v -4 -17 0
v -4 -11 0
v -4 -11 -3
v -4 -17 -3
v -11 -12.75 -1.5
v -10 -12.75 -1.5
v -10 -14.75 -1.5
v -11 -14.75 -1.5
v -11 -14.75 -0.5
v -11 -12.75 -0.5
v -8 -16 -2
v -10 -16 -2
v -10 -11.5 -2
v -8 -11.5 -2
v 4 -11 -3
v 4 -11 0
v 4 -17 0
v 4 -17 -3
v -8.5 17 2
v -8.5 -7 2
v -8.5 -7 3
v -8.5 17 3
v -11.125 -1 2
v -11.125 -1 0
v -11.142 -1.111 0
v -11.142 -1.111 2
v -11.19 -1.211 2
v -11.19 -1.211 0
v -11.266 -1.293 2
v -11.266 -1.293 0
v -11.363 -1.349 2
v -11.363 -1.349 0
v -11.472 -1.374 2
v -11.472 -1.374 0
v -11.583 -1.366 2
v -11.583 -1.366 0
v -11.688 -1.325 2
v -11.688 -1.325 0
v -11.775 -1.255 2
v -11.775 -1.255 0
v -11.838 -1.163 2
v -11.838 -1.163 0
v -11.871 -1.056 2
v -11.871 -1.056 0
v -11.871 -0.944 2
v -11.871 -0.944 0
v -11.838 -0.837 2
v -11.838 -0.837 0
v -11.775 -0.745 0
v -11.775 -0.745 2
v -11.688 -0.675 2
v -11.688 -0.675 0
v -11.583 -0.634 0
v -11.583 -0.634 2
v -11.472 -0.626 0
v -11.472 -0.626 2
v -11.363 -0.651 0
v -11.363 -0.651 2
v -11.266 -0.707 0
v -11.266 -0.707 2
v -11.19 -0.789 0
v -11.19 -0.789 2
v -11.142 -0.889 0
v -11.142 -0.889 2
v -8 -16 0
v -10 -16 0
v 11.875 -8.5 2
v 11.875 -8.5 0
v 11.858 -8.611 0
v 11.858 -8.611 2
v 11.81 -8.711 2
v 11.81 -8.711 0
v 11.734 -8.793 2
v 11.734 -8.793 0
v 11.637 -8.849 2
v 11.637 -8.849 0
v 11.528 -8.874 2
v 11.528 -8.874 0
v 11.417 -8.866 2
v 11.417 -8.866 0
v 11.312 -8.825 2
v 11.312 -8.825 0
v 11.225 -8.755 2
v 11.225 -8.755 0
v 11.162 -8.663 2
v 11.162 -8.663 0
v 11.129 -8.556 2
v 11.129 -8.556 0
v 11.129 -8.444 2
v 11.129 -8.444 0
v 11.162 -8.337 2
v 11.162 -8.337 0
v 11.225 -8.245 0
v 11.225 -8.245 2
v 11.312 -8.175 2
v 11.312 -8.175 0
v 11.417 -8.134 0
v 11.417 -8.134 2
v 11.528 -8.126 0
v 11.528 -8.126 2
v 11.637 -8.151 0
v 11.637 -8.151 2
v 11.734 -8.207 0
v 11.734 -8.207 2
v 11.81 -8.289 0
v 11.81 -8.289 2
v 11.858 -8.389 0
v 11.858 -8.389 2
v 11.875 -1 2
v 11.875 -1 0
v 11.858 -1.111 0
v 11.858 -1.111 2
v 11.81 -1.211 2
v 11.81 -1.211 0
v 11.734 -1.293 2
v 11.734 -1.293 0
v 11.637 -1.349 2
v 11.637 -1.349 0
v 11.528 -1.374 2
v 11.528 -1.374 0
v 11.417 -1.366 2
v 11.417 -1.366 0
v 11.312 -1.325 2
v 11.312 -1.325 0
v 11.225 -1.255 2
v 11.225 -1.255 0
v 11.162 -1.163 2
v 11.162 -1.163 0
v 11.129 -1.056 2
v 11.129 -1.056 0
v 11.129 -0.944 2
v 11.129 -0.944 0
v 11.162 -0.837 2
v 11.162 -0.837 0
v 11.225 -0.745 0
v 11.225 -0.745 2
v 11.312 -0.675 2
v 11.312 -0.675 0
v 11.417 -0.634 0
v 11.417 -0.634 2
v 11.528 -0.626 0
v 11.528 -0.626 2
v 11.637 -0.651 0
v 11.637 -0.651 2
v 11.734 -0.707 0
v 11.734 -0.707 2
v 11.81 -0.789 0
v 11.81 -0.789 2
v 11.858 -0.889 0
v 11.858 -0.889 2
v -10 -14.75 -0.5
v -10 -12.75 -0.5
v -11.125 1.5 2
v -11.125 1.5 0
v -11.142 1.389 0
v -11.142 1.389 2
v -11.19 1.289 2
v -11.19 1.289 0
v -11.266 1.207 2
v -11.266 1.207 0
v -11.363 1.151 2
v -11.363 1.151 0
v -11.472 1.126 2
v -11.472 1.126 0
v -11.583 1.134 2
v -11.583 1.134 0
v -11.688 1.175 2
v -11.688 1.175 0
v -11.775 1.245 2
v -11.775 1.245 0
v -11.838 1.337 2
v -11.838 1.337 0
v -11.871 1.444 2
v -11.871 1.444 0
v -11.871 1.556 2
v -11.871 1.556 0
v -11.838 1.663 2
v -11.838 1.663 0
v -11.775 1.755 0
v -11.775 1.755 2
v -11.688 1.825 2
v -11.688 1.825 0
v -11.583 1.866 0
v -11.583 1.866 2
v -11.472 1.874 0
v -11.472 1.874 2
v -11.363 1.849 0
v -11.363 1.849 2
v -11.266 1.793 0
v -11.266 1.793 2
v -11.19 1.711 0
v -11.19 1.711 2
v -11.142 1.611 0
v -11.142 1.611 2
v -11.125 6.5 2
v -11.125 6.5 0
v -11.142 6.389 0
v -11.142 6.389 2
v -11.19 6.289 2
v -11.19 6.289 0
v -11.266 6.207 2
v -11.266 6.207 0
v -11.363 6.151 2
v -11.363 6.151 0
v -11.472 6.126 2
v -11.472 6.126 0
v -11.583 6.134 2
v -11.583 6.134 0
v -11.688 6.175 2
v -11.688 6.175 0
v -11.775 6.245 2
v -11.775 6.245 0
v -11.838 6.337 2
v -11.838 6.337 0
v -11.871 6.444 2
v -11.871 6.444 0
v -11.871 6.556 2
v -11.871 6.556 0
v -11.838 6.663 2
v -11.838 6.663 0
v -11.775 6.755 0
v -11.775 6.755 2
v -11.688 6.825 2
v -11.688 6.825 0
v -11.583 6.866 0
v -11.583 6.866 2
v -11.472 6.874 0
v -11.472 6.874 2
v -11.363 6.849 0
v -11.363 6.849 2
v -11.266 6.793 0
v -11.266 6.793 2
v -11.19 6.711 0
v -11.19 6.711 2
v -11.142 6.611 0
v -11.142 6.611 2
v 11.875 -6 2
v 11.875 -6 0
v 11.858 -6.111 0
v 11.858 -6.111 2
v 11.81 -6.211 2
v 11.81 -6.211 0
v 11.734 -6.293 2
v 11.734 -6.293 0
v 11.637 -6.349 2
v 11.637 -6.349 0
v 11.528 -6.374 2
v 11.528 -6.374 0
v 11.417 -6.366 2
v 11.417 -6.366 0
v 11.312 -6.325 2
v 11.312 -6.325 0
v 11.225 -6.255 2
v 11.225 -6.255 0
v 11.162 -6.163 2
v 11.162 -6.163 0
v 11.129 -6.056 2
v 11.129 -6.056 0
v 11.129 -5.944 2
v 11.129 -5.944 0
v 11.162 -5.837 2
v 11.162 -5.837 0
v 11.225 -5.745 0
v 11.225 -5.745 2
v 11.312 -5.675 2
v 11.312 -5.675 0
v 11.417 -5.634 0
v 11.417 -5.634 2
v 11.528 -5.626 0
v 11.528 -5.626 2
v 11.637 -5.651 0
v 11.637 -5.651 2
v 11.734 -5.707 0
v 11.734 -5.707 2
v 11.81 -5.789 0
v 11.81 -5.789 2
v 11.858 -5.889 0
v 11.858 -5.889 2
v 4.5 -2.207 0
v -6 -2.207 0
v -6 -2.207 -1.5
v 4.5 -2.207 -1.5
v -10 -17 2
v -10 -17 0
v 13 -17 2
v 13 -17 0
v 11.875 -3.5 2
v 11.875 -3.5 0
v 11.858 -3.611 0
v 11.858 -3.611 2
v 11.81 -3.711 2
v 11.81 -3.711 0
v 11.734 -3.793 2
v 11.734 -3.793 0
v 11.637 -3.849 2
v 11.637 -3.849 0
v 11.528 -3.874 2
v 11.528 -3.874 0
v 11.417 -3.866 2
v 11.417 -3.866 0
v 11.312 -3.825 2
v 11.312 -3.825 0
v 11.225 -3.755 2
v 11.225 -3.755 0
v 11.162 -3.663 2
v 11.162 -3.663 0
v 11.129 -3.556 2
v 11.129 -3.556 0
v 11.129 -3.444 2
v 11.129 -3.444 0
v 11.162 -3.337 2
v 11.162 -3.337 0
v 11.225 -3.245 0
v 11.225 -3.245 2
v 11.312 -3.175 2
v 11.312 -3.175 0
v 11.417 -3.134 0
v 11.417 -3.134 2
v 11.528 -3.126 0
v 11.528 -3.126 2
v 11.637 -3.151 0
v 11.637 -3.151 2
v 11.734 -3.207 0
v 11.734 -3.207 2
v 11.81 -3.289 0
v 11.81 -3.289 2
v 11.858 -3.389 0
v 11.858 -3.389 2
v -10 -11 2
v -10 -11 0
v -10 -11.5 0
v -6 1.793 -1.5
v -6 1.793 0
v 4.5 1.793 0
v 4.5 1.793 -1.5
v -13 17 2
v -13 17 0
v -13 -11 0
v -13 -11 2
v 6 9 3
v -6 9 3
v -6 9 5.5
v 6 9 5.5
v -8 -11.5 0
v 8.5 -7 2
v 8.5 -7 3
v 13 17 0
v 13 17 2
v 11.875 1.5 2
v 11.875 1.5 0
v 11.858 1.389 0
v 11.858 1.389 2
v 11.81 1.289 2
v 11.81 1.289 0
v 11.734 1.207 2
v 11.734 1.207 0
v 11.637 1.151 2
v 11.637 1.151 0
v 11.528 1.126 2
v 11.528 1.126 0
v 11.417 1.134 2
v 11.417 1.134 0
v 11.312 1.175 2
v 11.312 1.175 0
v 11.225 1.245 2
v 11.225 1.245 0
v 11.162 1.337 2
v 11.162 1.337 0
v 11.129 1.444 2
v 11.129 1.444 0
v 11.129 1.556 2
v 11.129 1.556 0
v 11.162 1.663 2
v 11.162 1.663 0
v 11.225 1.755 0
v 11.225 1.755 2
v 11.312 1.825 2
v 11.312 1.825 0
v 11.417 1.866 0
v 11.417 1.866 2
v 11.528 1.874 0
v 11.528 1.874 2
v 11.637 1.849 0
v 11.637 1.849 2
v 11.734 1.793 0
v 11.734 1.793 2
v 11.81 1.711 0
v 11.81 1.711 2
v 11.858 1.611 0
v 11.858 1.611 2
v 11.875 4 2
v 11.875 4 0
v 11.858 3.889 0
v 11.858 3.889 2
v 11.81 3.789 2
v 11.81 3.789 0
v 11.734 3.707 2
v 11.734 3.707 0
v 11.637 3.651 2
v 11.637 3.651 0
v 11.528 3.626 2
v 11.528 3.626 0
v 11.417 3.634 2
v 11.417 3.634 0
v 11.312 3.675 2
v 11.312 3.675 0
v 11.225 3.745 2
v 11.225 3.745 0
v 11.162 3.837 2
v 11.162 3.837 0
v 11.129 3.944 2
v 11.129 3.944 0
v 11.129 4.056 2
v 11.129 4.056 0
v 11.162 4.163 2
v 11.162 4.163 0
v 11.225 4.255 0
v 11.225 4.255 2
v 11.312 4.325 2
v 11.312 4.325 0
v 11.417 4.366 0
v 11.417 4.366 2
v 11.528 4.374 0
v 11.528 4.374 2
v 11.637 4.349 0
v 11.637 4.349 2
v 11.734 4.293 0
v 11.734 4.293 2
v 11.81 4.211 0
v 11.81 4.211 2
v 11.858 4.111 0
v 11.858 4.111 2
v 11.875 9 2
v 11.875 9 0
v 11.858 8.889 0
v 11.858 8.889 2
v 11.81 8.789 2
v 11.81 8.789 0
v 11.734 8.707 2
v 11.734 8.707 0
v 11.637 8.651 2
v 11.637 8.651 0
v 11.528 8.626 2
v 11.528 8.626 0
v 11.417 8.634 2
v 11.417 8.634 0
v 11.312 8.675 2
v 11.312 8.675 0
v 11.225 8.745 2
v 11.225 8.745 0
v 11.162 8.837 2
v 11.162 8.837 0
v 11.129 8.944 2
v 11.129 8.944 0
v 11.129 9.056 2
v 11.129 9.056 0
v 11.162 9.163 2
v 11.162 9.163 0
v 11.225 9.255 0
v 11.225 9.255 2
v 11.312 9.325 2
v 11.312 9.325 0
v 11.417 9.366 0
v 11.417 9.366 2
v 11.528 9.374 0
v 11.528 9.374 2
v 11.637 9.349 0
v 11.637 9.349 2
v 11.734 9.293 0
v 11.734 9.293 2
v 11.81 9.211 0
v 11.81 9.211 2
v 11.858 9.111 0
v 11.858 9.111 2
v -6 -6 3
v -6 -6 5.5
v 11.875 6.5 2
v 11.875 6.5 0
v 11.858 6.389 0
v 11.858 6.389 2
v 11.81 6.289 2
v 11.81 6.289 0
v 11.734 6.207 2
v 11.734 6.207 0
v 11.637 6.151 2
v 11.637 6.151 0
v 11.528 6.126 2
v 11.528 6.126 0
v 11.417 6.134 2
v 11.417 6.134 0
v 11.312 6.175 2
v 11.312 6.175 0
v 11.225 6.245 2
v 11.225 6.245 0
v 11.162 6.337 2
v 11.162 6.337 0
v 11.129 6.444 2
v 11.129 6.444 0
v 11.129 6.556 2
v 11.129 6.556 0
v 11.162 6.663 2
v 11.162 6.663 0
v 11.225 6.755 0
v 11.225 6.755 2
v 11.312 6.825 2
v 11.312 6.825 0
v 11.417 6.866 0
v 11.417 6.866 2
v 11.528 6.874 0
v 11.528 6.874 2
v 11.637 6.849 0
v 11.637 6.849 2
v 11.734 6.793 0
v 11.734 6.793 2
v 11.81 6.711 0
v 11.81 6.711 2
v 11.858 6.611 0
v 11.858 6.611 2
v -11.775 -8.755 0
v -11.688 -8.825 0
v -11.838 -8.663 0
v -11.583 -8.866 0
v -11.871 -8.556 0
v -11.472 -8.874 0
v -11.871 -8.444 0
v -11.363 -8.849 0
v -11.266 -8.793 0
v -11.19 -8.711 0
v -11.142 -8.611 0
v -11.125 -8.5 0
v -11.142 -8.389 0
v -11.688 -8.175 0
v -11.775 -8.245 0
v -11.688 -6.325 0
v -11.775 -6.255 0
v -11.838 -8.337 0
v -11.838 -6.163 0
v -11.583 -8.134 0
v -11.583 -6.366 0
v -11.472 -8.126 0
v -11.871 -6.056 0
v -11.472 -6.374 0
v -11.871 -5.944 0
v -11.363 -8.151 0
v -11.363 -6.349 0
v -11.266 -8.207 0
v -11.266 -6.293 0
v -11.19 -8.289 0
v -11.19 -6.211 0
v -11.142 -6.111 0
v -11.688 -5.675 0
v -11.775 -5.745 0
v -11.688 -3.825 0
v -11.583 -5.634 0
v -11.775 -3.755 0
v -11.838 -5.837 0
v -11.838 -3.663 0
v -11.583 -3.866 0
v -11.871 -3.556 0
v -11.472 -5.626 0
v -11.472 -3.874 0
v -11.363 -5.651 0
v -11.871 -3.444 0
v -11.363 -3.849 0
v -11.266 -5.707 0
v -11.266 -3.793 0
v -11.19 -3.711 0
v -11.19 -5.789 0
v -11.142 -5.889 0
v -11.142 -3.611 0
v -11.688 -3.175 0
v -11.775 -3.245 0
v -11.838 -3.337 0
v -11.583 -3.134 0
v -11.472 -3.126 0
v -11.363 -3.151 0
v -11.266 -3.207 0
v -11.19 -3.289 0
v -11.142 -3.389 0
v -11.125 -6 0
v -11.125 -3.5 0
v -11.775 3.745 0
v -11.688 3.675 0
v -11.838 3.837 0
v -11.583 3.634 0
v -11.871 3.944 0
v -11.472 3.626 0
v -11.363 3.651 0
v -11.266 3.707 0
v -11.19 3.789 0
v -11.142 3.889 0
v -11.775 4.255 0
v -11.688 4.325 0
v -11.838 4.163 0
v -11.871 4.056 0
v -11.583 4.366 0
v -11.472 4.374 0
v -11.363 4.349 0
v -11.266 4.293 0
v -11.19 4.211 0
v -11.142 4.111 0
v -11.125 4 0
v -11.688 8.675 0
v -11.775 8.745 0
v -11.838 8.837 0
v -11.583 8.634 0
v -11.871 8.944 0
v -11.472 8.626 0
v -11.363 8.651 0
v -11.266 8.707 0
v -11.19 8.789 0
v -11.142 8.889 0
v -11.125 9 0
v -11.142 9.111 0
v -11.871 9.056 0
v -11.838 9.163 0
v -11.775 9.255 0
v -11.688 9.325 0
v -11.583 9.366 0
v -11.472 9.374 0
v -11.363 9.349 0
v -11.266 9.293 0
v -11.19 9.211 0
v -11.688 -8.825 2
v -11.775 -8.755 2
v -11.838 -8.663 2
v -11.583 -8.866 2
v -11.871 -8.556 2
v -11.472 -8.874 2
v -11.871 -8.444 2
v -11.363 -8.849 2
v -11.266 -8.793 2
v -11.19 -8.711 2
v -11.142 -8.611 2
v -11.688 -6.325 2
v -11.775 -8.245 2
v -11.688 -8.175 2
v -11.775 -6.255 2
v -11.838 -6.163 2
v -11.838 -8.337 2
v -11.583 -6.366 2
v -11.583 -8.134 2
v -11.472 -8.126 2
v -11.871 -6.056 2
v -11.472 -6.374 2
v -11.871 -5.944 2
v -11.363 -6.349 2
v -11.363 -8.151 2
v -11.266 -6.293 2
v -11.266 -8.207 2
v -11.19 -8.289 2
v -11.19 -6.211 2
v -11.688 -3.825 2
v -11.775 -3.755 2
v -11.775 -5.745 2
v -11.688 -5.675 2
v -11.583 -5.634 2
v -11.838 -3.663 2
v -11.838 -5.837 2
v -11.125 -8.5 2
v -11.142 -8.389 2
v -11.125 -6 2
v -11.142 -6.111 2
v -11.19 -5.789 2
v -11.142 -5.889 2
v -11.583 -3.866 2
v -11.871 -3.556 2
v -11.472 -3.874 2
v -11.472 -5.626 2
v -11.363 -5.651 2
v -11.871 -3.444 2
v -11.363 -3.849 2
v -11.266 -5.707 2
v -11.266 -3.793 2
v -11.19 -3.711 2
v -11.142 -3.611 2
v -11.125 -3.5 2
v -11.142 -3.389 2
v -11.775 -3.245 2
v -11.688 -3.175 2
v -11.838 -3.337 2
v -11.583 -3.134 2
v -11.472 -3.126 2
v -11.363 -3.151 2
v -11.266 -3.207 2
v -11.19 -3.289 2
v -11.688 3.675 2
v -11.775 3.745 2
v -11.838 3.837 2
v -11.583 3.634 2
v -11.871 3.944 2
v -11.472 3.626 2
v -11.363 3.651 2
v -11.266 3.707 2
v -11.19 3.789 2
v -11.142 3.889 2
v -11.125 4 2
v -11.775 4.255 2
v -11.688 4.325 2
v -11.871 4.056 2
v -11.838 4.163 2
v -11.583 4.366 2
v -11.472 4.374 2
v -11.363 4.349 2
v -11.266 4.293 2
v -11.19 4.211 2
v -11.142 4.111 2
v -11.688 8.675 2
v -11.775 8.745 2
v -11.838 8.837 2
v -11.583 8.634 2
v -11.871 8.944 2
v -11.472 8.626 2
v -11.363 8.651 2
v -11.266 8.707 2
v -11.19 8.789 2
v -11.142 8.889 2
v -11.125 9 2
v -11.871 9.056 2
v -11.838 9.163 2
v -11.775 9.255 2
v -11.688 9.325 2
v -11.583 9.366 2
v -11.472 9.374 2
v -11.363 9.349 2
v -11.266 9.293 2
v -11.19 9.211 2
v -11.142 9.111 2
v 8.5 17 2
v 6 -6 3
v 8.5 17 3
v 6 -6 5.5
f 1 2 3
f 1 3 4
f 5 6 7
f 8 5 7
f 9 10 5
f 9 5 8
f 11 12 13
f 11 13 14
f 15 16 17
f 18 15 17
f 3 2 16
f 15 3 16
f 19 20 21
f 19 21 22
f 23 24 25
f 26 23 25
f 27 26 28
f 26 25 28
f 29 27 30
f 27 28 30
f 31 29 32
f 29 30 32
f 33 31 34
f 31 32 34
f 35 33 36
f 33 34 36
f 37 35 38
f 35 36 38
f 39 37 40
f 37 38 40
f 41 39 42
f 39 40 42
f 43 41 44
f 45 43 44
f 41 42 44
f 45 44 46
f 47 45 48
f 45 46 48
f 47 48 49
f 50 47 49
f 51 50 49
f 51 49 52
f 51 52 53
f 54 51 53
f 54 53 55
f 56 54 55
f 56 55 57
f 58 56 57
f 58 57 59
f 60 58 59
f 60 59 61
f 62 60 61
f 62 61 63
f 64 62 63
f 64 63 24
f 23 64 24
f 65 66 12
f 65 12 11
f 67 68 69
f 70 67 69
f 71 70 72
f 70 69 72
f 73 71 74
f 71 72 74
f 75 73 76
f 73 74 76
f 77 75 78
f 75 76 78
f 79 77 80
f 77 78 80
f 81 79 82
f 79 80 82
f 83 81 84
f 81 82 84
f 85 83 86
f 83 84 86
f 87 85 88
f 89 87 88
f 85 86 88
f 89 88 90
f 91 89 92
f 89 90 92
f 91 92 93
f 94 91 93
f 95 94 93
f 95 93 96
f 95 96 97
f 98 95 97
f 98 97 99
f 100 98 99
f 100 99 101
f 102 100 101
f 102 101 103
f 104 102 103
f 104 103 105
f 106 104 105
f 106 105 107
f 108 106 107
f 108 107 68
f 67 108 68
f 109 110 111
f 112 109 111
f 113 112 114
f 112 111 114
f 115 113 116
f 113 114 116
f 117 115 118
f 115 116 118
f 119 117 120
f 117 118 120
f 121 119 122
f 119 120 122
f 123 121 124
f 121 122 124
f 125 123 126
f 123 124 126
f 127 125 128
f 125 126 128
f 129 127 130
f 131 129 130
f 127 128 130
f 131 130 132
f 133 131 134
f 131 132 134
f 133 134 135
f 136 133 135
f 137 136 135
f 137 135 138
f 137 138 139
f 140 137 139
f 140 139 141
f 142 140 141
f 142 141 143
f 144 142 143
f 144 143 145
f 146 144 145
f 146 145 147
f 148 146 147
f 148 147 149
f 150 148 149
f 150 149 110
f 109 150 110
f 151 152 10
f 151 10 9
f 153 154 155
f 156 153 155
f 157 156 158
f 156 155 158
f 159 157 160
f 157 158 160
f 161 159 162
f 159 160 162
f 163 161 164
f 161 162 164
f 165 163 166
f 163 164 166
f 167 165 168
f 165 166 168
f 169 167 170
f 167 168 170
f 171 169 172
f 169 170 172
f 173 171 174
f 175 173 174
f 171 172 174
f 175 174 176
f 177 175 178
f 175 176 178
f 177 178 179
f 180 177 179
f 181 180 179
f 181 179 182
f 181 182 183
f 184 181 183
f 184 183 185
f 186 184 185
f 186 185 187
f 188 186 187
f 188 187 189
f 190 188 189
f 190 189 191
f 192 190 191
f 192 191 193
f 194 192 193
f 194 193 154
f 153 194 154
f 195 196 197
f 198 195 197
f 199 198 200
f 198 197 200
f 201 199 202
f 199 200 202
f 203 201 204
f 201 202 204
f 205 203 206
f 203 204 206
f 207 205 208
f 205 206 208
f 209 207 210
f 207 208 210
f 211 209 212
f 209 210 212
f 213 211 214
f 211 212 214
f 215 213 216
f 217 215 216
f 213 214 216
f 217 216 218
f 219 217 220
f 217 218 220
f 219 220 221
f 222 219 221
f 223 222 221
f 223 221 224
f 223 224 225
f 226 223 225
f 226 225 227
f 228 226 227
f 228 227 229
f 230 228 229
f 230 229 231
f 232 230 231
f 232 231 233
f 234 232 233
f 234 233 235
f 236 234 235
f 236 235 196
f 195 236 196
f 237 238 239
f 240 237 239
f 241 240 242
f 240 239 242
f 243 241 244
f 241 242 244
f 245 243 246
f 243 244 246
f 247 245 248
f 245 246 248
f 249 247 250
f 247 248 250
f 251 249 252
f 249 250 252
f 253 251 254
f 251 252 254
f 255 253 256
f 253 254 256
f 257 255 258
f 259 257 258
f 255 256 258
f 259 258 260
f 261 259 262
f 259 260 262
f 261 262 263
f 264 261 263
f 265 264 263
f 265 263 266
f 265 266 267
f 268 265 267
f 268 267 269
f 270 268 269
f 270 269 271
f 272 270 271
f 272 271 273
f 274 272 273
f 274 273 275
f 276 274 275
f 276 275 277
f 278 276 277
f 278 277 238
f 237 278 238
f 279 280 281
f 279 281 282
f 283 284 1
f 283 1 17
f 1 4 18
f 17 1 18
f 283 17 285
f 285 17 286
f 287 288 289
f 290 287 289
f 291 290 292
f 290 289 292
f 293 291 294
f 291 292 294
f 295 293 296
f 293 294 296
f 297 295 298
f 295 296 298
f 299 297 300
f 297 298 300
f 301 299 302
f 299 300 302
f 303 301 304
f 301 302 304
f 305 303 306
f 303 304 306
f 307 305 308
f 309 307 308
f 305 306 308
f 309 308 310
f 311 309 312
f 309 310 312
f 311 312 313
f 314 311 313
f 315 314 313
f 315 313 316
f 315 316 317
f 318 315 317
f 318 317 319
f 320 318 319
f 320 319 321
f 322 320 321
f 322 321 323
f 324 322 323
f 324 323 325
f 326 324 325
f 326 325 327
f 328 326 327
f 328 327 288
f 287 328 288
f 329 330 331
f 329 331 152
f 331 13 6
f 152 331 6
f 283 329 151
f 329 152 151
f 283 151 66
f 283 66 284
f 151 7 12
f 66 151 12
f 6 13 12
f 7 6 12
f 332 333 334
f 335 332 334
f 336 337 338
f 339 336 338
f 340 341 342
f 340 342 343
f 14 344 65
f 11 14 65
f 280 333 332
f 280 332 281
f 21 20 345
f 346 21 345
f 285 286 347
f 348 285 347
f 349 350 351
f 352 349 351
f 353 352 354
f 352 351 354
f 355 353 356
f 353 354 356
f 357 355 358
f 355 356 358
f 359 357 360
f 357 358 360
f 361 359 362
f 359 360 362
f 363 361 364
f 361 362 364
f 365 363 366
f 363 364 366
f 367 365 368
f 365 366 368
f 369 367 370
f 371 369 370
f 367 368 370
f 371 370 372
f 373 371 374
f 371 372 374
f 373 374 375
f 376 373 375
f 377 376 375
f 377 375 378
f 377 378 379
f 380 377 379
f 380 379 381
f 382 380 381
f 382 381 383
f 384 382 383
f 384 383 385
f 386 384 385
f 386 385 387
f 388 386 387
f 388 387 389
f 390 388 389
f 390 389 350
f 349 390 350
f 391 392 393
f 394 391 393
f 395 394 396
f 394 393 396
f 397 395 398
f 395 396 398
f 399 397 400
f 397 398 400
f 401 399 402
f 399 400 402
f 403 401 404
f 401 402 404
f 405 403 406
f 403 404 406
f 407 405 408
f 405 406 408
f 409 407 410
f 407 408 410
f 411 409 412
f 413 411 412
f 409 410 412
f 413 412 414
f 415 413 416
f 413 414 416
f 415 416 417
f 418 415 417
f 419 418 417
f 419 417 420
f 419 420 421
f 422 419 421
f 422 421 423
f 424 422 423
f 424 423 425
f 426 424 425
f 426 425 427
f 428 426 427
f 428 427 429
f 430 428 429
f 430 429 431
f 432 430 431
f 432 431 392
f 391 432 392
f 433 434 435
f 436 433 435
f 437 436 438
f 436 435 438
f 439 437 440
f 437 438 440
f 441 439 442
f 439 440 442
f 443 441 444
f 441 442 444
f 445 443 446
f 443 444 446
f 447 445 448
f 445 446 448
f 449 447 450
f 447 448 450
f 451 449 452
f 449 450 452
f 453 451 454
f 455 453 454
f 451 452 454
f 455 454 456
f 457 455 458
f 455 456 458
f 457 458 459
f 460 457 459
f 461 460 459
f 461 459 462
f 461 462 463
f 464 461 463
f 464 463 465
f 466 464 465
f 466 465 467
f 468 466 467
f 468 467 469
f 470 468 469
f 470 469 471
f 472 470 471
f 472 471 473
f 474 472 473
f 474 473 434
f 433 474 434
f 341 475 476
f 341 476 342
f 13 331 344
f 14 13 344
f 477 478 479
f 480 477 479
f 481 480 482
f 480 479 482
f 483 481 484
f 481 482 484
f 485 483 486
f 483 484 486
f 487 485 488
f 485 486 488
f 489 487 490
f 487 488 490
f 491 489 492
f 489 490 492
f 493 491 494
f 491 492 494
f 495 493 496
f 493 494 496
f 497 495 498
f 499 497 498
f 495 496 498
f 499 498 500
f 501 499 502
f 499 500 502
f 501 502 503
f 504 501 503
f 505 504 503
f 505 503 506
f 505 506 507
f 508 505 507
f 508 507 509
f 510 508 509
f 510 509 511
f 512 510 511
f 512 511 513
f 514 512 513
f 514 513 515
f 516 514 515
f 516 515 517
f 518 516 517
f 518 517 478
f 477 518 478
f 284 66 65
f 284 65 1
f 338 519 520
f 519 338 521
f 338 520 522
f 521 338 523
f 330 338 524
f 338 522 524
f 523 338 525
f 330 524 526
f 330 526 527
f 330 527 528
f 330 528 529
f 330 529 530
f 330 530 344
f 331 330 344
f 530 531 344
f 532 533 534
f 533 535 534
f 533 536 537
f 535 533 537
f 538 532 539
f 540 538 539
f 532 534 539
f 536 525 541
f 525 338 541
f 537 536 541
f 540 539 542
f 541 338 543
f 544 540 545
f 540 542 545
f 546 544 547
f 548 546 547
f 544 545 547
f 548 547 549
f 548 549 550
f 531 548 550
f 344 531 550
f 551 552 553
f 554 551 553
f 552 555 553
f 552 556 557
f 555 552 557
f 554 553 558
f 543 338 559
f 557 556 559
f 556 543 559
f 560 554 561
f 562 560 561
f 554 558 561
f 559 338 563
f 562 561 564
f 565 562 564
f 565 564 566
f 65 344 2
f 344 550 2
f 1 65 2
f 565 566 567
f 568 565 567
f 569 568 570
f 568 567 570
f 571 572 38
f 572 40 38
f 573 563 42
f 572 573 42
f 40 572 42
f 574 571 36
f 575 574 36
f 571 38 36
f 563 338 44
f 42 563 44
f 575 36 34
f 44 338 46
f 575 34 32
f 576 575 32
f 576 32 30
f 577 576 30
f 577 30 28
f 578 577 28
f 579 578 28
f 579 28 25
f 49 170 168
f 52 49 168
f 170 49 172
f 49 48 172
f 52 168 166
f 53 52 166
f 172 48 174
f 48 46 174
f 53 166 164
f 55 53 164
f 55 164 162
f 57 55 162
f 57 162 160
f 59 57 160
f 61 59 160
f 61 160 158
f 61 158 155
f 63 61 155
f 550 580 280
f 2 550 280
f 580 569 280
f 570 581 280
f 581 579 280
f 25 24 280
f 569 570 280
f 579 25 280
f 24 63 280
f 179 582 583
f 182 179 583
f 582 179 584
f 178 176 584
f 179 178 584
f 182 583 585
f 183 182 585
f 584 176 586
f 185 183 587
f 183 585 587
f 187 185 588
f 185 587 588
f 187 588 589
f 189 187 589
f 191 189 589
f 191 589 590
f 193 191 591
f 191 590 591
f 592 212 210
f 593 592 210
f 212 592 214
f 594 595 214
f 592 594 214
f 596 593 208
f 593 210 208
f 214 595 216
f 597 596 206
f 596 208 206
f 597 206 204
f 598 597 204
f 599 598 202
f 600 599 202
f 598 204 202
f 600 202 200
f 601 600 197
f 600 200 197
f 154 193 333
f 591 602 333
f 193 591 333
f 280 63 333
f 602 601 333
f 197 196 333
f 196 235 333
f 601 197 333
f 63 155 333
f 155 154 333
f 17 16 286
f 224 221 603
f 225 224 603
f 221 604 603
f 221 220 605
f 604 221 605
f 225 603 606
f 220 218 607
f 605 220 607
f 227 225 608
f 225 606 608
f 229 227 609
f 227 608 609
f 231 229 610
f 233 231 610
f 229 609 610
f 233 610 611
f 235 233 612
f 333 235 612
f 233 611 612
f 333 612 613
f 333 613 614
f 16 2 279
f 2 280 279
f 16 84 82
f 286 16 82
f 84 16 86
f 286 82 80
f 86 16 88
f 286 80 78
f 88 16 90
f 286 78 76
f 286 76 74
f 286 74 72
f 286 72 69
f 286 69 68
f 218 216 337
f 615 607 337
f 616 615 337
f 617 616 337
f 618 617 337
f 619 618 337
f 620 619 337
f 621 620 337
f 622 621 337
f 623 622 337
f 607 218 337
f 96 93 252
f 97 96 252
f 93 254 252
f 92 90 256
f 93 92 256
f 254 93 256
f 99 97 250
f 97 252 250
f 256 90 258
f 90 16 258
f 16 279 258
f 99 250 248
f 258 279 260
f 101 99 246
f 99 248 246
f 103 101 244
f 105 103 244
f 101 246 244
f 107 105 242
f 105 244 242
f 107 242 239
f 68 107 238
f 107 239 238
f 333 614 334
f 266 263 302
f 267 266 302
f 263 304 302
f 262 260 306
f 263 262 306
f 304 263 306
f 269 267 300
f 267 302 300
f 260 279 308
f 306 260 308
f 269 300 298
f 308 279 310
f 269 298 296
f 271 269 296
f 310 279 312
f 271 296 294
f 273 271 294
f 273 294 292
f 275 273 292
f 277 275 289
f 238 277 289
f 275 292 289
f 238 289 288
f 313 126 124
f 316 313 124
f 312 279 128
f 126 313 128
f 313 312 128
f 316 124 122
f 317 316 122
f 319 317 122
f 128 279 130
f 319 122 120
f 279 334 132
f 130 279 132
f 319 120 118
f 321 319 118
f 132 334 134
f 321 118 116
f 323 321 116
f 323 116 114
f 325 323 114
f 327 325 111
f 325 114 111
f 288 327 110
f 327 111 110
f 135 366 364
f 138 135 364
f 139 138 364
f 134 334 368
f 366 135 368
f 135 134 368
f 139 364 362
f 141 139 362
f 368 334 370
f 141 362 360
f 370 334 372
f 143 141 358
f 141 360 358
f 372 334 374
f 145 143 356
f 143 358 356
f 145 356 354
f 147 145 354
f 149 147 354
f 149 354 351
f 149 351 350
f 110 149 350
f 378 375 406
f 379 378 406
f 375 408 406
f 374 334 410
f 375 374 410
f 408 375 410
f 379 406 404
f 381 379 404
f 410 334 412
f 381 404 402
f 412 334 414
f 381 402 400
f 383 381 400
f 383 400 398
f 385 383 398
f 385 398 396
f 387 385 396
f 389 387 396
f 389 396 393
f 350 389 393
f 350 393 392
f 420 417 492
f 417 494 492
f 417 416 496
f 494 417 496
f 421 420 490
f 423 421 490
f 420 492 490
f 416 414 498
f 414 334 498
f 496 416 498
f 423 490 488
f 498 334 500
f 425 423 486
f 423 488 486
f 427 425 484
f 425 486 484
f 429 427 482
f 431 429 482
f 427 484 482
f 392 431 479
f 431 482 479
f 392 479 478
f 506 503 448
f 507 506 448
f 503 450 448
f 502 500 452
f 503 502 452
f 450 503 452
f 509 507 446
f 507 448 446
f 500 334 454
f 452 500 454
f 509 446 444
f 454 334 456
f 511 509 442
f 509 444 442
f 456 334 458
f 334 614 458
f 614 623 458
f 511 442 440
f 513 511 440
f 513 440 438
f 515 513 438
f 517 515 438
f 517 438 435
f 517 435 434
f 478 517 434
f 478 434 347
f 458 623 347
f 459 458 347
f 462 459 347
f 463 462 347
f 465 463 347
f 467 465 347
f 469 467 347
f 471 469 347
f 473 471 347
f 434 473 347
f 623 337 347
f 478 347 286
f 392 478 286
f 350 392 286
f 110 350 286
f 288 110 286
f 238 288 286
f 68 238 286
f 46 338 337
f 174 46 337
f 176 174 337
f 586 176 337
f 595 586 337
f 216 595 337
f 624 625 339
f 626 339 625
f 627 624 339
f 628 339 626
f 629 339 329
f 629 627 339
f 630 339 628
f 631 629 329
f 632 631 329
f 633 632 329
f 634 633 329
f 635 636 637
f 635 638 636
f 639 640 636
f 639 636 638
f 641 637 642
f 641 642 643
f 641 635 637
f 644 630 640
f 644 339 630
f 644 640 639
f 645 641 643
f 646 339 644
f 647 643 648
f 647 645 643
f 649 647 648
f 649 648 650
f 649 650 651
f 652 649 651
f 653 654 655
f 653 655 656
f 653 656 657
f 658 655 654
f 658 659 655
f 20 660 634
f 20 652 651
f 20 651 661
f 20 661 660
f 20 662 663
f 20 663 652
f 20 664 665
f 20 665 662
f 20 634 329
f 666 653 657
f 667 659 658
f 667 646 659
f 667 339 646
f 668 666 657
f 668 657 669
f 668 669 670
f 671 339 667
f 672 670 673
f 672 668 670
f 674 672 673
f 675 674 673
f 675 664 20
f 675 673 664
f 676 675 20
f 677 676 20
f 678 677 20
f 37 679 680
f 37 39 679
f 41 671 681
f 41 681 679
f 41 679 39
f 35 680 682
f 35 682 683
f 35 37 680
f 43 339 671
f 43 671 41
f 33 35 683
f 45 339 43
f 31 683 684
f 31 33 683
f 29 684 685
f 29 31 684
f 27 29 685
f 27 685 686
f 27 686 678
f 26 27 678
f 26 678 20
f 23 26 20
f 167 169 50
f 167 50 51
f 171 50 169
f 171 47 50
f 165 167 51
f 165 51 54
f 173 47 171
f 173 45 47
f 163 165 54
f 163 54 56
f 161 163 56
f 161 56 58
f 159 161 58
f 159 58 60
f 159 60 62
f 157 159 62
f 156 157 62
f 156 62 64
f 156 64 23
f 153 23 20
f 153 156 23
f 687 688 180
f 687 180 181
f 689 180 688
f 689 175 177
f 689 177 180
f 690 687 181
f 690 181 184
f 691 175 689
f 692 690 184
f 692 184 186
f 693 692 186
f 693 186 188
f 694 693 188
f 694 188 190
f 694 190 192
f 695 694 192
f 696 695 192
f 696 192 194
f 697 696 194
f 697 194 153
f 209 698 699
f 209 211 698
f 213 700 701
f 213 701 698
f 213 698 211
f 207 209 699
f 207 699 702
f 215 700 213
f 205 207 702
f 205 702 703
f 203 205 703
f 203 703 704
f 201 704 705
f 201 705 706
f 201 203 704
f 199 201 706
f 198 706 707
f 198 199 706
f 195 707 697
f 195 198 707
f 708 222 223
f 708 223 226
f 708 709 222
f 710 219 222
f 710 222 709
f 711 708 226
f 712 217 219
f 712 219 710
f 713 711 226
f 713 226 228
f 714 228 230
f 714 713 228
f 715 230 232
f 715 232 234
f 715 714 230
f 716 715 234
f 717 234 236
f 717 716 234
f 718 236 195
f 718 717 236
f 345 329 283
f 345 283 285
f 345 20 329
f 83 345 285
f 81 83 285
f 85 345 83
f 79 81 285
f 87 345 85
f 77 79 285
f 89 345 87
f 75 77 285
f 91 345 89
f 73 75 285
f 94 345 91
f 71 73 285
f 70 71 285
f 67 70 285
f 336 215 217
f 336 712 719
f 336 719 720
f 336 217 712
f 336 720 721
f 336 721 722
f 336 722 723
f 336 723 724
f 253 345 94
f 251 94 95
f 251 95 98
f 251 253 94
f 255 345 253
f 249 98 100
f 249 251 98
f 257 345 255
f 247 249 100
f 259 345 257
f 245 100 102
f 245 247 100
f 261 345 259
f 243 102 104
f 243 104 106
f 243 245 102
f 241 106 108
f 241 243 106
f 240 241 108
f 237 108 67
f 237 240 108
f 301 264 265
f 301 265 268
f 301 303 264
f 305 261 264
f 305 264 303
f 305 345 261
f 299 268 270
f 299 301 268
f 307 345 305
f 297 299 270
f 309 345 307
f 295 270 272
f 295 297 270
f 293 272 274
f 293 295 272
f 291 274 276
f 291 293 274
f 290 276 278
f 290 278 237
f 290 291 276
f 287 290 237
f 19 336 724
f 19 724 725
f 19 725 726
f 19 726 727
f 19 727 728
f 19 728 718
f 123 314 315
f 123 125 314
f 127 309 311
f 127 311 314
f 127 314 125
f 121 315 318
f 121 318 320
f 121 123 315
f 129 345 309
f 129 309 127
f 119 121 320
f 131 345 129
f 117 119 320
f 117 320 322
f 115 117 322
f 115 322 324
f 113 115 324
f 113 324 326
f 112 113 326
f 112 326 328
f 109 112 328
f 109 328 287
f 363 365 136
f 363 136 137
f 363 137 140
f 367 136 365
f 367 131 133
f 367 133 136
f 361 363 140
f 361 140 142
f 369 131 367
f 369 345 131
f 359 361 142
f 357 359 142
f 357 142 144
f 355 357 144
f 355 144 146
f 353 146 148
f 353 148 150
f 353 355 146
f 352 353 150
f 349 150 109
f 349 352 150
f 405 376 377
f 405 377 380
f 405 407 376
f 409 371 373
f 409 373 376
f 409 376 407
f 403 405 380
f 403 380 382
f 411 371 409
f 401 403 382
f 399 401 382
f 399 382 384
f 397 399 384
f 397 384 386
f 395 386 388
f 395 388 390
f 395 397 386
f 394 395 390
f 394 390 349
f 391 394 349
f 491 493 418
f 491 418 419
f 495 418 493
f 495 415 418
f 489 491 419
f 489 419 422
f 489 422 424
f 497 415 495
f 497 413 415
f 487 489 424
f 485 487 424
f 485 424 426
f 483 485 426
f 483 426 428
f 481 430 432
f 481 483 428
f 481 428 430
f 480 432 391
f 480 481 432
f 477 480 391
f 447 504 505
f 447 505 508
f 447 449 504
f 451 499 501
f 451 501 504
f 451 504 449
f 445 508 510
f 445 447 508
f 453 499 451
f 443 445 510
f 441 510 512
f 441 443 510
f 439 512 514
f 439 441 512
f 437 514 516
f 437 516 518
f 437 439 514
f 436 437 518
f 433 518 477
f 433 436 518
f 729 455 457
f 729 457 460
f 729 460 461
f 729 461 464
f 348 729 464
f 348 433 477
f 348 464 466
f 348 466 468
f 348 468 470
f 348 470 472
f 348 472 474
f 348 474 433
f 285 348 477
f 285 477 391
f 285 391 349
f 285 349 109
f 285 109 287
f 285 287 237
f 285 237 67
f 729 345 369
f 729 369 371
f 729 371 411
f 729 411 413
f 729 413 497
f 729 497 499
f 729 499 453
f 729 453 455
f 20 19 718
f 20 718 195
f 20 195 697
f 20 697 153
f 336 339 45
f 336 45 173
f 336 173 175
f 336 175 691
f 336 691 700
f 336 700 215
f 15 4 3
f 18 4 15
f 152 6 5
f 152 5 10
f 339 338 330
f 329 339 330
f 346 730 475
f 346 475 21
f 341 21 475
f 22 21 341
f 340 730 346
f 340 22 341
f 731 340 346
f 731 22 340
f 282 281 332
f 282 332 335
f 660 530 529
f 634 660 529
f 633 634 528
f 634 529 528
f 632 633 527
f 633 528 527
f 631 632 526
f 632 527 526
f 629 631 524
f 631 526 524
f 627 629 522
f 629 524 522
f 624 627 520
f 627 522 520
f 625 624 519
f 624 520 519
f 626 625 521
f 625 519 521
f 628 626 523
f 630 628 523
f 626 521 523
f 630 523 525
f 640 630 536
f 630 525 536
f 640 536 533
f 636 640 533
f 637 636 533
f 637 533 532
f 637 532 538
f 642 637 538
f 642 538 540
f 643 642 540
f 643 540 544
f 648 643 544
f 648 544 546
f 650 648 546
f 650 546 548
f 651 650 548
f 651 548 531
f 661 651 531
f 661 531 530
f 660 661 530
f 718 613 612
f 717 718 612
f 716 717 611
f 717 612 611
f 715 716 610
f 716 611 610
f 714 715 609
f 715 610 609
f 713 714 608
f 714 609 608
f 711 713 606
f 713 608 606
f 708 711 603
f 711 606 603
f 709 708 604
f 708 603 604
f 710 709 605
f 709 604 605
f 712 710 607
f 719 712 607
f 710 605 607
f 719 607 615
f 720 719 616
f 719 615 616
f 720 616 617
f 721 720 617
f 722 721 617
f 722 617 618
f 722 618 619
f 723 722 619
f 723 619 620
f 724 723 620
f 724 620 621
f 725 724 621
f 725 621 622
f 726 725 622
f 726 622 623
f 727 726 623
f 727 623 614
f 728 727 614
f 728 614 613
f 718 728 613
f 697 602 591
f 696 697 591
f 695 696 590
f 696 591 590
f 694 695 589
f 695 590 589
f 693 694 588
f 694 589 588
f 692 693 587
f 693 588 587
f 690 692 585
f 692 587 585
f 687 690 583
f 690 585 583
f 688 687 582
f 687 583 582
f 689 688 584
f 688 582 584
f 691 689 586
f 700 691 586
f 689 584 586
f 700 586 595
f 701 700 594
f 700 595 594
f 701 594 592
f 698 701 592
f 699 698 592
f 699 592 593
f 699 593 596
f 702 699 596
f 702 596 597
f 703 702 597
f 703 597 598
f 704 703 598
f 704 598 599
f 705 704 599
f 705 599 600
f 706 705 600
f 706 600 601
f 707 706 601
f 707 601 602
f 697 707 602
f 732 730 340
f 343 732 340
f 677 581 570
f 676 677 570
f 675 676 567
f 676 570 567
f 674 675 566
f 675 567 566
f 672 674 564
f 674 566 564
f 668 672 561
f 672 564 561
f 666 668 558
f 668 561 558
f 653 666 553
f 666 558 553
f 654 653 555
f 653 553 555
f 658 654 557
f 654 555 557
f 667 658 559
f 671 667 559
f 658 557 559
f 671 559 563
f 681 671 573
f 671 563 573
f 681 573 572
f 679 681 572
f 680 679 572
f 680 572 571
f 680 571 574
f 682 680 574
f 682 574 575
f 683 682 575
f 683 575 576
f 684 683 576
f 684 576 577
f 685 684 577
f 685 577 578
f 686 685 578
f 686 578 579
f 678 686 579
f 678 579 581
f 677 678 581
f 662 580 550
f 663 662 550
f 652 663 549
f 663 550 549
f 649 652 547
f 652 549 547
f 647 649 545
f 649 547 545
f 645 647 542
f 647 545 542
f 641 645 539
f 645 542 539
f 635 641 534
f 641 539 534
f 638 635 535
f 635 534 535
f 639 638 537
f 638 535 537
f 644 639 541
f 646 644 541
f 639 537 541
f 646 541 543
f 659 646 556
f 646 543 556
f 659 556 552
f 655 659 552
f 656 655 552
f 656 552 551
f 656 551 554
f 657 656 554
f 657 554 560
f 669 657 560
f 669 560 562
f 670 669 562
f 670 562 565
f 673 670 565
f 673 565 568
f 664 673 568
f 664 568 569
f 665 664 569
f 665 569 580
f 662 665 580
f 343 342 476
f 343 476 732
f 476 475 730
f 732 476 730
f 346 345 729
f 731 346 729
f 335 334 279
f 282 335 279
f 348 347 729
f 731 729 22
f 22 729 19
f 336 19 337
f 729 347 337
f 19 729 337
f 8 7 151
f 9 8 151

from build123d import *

# Parameters (mm, degrees)
F1_DEPTH  = 2
F2_W      = 17
F2_H      = 24
F3_DEPTH  = 1
F4_W      = 12
F4_H      = 15
F5_DEPTH  = 2.5
F6_W      = 8
F6_H      = 6
F7_DEPTH  = 3
F8_W      = 2
F8_H      = 4.5
F9_DEPTH  = 2
F10_W     = 2
F10_H     = 1
F11_DEPTH = 1
F12_W     = 10.5
F12_H     = 4
F13_DEPTH = 1.5
F14_R     = 0.375
F15_DEPTH = 25


with BuildPart() as f1:
    # F0 (on Top) → F1 (new body)
    with BuildSketch(Plane.XY):
        Polygon((13, 17), (-13, 17), (-13, -11), (-10, -11), (-10, -17), (13, -17), align=None)
    extrude(amount=F1_DEPTH)

    # F2 (on face) → F3 (join)
    with BuildSketch(Plane.XY.offset(2)):
        with Locations((0, 5)):
            Rectangle(F2_W, F2_H)
    extrude(amount=F3_DEPTH)

    # F4 (on face) → F5 (join)
    with BuildSketch(Plane.XY.offset(3)):
        with Locations((0, 1.5)):
            Rectangle(F4_W, F4_H)
    extrude(amount=F5_DEPTH)

    # F6 (on face) → F7 (join)
    with BuildSketch(Plane(origin=(0, 0, 0), x_dir=(1, 0, 0), z_dir=(0, 0, -1))):
        with Locations((0, 14)):
            Rectangle(F6_W, F6_H)
    extrude(amount=F7_DEPTH)

    # F8 (on face) → F9 (join)
    with BuildSketch(Plane(origin=(0, 0, 0), x_dir=(1, 0, 0), z_dir=(0, 0, -1))):
        with Locations((-9, 13.75)):
            Rectangle(F8_W, F8_H)
    extrude(amount=F9_DEPTH)

    # F10 (on face) → F11 (join)
    with BuildSketch(Plane(origin=(-10, 0, 0), x_dir=(0, -1, 0), z_dir=(-1, 0, 0))):
        with Locations((13.75, -1)):
            Rectangle(F10_W, F10_H)
    extrude(amount=F11_DEPTH)

    # F12 (on face) → F13 (join)
    with BuildSketch(Plane(origin=(0, 0, 0), x_dir=(1, 0, 0), z_dir=(0, 0, -1))):
        with Locations((-0.75, 0.206931)):
            Rectangle(F12_W, F12_H)
    extrude(amount=F13_DEPTH)

    # F14 (on face) → F15 (cut)
    with BuildSketch(Plane(origin=(0, 0, 0), x_dir=(1, 0, 0), z_dir=(0, 0, -1))):
        with Locations((-11.5, -9)):
            Circle(F14_R)
        with Locations((-11.5, -6.5)):
            Circle(F14_R)
        with Locations((-11.5, -4)):
            Circle(F14_R)
        with Locations((-11.5, -1.5)):
            Circle(F14_R)
        with Locations((-11.5, 1)):
            Circle(F14_R)
        with Locations((-11.5, 3.5)):
            Circle(F14_R)
        with Locations((-11.5, 6)):
            Circle(F14_R)
        with Locations((-11.5, 8.5)):
            Circle(F14_R)
        with Locations((11.5, -9)):
            Circle(F14_R)
        with Locations((11.5, -6.5)):
            Circle(F14_R)
        with Locations((11.5, -4)):
            Circle(F14_R)
        with Locations((11.5, -1.5)):
            Circle(F14_R)
        with Locations((11.5, 1)):
            Circle(F14_R)
        with Locations((11.5, 3.5)):
            Circle(F14_R)
        with Locations((11.5, 6)):
            Circle(F14_R)
        with Locations((11.5, 8.5)):
            Circle(F14_R)
    extrude(amount=-F15_DEPTH, mode=Mode.SUBTRACT)


solid = f1.part
